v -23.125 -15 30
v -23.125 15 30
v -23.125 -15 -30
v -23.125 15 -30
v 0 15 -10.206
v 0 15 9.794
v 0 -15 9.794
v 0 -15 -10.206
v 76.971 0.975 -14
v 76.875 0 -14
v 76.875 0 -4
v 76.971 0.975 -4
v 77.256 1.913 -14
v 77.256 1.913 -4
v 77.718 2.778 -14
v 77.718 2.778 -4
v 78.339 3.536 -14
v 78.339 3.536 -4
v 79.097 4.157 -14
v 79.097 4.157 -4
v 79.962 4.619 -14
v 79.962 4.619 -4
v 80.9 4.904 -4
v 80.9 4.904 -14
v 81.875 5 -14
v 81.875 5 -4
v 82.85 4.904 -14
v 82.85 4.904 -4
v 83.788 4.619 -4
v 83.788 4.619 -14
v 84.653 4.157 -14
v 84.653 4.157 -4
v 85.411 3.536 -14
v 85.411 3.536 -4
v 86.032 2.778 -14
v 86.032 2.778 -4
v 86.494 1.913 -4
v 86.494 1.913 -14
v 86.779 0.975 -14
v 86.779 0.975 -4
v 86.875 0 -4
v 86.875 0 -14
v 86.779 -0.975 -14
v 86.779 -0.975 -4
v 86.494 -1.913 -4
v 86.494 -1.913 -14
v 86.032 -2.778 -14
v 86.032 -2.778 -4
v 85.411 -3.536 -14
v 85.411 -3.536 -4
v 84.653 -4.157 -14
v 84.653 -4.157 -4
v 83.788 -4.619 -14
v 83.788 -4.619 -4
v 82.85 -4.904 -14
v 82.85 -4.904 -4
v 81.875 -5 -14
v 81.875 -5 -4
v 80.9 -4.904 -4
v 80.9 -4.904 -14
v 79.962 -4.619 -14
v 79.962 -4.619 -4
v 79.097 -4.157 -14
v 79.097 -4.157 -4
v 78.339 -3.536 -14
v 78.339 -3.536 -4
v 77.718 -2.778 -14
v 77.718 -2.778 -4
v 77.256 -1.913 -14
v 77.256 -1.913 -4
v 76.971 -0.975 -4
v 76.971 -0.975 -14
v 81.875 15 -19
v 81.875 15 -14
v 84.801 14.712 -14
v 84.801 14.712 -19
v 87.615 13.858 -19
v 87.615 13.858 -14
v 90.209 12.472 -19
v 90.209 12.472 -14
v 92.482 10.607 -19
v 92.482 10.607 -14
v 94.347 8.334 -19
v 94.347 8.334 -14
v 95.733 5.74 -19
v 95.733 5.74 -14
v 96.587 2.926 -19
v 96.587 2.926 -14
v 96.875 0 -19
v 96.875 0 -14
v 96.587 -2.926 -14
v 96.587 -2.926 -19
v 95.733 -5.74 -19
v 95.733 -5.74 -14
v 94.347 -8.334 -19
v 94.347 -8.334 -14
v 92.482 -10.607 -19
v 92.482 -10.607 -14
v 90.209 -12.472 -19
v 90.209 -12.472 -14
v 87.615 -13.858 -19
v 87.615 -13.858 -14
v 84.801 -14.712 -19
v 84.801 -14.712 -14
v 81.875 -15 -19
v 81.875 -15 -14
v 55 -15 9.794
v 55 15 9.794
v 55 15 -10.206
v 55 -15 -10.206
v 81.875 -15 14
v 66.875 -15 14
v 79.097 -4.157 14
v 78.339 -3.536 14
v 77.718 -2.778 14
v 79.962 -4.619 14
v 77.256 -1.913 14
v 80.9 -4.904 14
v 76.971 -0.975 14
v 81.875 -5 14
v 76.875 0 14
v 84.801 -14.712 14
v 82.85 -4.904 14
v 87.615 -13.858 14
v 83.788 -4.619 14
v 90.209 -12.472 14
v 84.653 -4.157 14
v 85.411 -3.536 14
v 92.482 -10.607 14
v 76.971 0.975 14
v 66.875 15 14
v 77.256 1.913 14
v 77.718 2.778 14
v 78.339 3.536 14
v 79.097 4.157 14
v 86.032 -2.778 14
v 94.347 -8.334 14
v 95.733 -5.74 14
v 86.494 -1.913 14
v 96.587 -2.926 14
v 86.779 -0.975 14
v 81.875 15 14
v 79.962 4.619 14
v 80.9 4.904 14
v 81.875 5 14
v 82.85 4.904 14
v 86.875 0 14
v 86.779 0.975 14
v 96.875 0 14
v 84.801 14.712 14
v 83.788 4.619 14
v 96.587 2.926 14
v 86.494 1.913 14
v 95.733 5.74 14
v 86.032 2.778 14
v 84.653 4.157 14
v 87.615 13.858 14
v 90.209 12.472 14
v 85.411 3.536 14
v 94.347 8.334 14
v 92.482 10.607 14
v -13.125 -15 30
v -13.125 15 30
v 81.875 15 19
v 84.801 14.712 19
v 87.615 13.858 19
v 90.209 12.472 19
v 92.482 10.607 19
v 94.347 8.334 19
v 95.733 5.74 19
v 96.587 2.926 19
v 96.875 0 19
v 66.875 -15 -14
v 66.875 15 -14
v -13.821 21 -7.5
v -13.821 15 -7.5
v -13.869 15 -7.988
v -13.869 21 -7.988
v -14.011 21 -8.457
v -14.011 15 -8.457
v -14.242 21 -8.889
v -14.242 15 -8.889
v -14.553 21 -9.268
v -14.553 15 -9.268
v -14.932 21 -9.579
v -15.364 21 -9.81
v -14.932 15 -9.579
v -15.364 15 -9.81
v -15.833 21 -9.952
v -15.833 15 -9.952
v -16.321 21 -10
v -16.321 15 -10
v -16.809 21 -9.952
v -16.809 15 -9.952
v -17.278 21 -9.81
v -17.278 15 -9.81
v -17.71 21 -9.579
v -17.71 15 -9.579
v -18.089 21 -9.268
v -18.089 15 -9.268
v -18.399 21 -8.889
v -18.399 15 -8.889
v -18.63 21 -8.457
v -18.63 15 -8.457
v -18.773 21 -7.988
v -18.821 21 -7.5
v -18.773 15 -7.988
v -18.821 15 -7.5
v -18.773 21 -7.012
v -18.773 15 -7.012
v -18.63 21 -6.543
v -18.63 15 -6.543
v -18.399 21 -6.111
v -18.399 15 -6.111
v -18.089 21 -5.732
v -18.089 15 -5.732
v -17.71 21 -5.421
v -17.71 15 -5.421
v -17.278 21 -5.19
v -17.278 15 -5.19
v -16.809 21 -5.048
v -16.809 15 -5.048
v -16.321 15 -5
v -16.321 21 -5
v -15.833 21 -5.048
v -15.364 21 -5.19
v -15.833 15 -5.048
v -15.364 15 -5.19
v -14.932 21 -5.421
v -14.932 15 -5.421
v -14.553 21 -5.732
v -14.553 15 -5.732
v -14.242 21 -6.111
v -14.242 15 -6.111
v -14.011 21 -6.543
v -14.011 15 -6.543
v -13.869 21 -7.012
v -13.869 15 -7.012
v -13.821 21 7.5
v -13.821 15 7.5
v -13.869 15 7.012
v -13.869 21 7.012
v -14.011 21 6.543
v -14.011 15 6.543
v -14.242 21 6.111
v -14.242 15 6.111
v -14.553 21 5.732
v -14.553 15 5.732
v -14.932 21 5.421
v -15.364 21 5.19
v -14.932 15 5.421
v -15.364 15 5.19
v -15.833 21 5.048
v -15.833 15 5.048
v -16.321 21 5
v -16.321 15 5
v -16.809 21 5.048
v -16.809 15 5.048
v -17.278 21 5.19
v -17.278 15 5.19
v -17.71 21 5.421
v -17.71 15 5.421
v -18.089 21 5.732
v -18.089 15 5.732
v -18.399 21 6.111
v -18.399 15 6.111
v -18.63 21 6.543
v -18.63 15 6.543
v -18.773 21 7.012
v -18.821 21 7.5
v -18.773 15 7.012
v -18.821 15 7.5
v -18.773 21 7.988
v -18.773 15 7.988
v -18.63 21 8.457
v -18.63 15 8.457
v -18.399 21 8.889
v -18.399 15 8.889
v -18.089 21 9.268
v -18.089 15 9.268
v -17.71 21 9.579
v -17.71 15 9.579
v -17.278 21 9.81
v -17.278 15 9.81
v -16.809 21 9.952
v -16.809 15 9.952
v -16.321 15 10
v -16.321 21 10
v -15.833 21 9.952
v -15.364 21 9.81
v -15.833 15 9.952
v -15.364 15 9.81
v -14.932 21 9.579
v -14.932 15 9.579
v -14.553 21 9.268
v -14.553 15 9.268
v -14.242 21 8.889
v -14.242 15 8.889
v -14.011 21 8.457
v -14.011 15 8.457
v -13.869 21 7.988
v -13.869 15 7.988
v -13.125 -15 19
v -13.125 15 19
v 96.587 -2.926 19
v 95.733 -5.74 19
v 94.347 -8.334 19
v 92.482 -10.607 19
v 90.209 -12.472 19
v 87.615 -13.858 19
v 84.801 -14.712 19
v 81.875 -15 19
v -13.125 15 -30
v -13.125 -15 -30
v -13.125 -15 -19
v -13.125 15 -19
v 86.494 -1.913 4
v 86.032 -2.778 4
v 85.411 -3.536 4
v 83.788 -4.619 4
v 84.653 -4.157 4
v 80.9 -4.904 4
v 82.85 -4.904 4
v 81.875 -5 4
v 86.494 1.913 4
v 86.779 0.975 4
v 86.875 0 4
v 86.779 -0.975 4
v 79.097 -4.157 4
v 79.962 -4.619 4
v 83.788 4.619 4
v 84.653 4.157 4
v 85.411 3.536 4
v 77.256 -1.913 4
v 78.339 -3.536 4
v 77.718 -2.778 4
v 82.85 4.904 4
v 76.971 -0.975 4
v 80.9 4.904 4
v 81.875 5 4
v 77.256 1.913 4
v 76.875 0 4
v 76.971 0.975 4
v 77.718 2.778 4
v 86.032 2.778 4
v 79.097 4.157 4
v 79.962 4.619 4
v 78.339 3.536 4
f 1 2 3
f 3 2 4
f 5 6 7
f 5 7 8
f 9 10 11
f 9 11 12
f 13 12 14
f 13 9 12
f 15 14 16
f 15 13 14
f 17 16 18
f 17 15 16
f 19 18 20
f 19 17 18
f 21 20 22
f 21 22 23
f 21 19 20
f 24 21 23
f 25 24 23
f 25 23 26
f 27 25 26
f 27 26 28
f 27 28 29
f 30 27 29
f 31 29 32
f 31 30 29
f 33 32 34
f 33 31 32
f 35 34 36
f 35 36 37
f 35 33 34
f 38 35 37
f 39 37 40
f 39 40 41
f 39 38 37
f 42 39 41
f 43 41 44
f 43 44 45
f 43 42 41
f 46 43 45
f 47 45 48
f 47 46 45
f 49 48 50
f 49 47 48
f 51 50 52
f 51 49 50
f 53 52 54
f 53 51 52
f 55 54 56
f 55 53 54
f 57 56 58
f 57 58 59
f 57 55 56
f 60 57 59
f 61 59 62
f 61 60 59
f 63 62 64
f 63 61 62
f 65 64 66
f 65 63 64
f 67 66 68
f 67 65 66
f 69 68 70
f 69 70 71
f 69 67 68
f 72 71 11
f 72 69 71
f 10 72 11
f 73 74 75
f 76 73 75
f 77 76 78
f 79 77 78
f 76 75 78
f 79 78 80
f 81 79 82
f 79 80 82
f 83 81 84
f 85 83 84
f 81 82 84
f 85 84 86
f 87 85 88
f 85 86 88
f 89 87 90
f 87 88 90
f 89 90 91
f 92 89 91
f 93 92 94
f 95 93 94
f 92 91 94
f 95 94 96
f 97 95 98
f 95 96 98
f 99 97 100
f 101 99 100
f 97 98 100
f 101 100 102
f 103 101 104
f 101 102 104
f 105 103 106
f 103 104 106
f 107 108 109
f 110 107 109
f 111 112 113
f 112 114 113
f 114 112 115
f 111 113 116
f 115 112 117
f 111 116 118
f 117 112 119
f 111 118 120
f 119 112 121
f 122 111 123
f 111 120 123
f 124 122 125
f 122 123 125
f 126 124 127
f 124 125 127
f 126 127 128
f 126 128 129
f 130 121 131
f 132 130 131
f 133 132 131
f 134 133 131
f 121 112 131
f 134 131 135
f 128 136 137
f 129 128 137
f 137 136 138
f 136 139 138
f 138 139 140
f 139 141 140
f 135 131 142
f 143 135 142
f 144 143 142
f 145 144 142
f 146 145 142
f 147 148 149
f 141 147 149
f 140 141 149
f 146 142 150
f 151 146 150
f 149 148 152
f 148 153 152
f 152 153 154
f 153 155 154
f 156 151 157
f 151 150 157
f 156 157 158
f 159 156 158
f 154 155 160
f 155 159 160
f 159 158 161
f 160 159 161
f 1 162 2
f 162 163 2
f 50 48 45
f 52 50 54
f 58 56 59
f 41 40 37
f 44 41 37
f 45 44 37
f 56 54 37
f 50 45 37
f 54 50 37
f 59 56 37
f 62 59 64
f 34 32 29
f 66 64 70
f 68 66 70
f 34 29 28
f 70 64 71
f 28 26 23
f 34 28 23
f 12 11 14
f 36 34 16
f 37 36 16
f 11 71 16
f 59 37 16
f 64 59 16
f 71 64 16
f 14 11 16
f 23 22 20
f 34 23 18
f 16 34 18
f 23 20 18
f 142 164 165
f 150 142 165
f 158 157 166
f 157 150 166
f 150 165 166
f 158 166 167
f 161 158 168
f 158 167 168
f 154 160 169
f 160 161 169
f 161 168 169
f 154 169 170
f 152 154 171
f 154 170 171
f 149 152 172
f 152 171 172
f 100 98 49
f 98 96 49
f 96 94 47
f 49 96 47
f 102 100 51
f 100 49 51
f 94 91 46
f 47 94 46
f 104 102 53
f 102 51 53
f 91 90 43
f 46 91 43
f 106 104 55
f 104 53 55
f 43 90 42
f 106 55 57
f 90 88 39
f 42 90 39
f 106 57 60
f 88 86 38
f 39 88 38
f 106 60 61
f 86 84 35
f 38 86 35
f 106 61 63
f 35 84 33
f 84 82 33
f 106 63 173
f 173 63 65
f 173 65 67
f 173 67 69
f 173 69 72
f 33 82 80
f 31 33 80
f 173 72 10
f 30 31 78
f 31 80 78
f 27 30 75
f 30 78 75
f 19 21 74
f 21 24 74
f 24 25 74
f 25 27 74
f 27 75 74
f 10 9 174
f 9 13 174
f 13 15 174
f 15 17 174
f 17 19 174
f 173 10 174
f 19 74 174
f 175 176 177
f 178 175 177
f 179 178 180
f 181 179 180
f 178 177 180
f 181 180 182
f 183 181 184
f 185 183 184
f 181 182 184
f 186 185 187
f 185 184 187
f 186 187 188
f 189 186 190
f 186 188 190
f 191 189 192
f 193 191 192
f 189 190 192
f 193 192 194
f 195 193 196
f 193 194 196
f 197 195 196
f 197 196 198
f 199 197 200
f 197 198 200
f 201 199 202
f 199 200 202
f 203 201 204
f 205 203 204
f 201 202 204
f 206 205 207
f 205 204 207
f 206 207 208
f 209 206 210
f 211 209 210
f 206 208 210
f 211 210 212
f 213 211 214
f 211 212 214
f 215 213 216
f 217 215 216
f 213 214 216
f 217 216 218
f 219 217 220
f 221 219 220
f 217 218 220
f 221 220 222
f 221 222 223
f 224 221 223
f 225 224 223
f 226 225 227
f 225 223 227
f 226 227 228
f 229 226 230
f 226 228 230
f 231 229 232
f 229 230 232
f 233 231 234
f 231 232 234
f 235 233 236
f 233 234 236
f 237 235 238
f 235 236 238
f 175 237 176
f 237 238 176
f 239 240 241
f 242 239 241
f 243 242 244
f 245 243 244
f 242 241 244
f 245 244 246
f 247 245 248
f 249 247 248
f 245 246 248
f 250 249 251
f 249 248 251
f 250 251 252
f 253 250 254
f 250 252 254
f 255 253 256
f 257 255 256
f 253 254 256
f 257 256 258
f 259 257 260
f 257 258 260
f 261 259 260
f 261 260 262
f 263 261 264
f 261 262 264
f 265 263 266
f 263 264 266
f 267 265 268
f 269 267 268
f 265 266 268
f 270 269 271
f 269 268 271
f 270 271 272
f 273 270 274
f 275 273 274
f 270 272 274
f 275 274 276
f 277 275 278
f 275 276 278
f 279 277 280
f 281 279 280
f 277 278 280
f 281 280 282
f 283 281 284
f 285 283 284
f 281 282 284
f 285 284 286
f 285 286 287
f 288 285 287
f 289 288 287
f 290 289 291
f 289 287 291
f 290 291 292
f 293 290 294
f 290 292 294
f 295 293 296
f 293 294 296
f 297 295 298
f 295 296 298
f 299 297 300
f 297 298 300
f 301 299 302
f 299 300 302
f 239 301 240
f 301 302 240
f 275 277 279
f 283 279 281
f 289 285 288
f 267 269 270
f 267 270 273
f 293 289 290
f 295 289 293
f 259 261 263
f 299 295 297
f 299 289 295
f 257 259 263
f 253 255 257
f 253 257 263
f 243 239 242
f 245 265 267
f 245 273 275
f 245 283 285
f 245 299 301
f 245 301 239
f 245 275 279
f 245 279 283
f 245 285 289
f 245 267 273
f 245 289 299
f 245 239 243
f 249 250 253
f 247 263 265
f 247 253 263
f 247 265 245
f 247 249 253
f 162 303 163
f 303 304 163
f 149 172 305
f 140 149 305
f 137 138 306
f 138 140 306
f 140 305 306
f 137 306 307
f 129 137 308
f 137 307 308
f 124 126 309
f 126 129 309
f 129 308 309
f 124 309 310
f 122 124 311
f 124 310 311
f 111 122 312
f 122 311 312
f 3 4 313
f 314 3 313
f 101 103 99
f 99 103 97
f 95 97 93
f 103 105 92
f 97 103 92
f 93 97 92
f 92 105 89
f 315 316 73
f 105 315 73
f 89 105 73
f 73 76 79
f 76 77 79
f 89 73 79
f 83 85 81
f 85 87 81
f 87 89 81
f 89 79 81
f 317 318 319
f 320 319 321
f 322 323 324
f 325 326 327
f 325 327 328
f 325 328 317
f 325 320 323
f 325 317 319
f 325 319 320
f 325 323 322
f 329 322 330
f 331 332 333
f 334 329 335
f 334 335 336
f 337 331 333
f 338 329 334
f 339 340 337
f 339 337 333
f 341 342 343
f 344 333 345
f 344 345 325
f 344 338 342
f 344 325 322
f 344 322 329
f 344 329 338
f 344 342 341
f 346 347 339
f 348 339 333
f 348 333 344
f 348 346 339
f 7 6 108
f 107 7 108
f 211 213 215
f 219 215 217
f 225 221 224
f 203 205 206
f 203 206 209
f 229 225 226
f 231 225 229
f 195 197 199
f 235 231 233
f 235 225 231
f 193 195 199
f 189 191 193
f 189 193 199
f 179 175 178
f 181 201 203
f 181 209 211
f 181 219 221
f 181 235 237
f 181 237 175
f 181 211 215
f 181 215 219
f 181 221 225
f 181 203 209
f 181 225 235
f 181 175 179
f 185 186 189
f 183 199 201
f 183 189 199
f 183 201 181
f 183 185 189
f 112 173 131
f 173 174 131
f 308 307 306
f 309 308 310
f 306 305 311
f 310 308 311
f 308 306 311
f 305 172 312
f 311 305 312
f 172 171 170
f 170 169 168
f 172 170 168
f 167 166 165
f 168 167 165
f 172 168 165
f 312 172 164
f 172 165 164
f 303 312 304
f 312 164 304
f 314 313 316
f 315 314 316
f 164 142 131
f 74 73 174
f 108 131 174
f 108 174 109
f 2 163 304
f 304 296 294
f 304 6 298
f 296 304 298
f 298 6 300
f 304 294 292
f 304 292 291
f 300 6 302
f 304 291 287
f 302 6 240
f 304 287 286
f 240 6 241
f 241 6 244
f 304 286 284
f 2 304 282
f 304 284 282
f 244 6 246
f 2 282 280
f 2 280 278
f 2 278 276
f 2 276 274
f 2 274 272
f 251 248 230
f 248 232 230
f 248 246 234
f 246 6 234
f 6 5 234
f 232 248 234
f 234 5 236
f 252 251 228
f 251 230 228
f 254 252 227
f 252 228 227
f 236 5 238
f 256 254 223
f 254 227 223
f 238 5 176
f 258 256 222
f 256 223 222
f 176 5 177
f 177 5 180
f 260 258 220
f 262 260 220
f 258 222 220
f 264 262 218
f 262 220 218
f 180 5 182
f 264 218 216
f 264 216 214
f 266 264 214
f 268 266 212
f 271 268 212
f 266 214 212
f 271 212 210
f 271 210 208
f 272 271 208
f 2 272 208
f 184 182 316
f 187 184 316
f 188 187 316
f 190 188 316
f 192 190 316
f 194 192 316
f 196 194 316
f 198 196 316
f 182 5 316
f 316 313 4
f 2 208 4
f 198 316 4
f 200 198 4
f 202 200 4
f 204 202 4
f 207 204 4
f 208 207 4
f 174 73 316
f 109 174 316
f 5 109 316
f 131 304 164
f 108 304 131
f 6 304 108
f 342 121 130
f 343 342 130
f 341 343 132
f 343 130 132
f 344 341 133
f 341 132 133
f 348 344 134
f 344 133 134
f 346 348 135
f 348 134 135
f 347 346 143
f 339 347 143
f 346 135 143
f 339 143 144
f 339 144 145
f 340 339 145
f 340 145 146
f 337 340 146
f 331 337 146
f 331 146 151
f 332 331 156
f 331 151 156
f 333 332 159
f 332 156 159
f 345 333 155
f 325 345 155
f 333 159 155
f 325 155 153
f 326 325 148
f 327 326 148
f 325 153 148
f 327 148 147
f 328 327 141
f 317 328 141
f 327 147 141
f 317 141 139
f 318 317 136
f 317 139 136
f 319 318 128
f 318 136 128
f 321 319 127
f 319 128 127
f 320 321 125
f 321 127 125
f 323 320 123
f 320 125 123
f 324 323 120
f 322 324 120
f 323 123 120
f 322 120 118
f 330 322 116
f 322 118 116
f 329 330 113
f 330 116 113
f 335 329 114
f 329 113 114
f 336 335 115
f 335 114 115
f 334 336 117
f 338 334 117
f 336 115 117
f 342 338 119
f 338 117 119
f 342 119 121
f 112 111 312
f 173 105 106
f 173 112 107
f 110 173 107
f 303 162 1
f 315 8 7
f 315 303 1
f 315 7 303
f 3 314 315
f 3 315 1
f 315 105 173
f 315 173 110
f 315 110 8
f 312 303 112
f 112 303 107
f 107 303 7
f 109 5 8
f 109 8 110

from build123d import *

# Parameters (mm, degrees)
BOSS_EXTRUDE1_DEPTH      = 15
BOSS_EXTRUDE1_DEPTH_BACK = 15
CUT_EXTRUDE1_DEPTH       = 38
SKETCH6_W                = 55
SKETCH6_H                = 20
CUT_EXTRUDE2_DEPTH       = 38
SKETCH8_R                = 5
BOSS_EXTRUDE2_DEPTH      = 10
SKETCH9_R                = 2.5
BOSS_EXTRUDE3_DEPTH      = 6


with BuildPart() as part:
    # Sketch1 → Boss-Extrude1 (new, two sides: drawn at the far end of the back side and taken through both)
    with BuildSketch(Plane(origin=(0, 0, 0), x_dir=(1, 0, 0), z_dir=(0, 1, 0)).offset(-BOSS_EXTRUDE1_DEPTH_BACK)):
        Polygon((-13.124974518, 30), (-13.124974518, 19), (96.875025482, 19), (96.875025482, 14), (66.875025482, 14), (66.875025482, -14), (96.875025482, -14), (96.875025482, -19), (-13.124974518, -19), (-13.124974518, -30), (-23.124974518, -30), (-23.124974518, 30), align=None)
    extrude(amount=BOSS_EXTRUDE1_DEPTH + BOSS_EXTRUDE1_DEPTH_BACK)

    # Sketch4 → Cut-Extrude1 (cut)
    with BuildSketch(Plane.XY.offset(19)):
        with BuildLine():
            Line((96.875025482, -15), (96.875025482, 0))
            ThreePointArc((96.875025482, 0), (92.4816272, -10.606601718), (81.875025482, -15))
            Line((81.875025482, -15), (96.875025482, -15))
        make_face()
        with BuildLine():
            Line((96.875025482, 15), (81.875025482, 15))
            ThreePointArc((81.875025482, 15), (92.4816272, 10.606601718), (96.875025482, 0))
            Line((96.875025482, 0), (96.875025482, 15))
        make_face()
    extrude(amount=-CUT_EXTRUDE1_DEPTH, mode=Mode.SUBTRACT)

    # Sketch6 → Cut-Extrude2 (cut)
    with BuildSketch(Plane(origin=(0, 15, 0), x_dir=(1, 0, 0), z_dir=(0, 1, 0))):
        with Locations((27.5, 0.205975337)):
            Rectangle(SKETCH6_W, SKETCH6_H)
    extrude(amount=-CUT_EXTRUDE2_DEPTH, mode=Mode.SUBTRACT)

    # Sketch8 → Boss-Extrude2 (add)
    with BuildSketch(Plane(origin=(0, 0, 14), x_dir=(-1, 0, 0), z_dir=(0, 0, -1))):
        with Locations((-81.875025482, 0)):
            Circle(SKETCH8_R)
    boss_extrude2 = extrude(amount=BOSS_EXTRUDE2_DEPTH)

    # Mirror1: Boss-Extrude2 across plane
    add(boss_extrude2.mirror(Plane.XY))

    # Sketch9 → Boss-Extrude3 (add)
    with BuildSketch(Plane(origin=(0, 15, 0), x_dir=(1, 0, 0), z_dir=(0, 1, 0))):
        with Locations((-16.320792203, 7.5)):
            Circle(SKETCH9_R)
        with Locations((-16.320792203, -7.5)):
            Circle(SKETCH9_R)
    extrude(amount=BOSS_EXTRUDE3_DEPTH)


solid = part.part
